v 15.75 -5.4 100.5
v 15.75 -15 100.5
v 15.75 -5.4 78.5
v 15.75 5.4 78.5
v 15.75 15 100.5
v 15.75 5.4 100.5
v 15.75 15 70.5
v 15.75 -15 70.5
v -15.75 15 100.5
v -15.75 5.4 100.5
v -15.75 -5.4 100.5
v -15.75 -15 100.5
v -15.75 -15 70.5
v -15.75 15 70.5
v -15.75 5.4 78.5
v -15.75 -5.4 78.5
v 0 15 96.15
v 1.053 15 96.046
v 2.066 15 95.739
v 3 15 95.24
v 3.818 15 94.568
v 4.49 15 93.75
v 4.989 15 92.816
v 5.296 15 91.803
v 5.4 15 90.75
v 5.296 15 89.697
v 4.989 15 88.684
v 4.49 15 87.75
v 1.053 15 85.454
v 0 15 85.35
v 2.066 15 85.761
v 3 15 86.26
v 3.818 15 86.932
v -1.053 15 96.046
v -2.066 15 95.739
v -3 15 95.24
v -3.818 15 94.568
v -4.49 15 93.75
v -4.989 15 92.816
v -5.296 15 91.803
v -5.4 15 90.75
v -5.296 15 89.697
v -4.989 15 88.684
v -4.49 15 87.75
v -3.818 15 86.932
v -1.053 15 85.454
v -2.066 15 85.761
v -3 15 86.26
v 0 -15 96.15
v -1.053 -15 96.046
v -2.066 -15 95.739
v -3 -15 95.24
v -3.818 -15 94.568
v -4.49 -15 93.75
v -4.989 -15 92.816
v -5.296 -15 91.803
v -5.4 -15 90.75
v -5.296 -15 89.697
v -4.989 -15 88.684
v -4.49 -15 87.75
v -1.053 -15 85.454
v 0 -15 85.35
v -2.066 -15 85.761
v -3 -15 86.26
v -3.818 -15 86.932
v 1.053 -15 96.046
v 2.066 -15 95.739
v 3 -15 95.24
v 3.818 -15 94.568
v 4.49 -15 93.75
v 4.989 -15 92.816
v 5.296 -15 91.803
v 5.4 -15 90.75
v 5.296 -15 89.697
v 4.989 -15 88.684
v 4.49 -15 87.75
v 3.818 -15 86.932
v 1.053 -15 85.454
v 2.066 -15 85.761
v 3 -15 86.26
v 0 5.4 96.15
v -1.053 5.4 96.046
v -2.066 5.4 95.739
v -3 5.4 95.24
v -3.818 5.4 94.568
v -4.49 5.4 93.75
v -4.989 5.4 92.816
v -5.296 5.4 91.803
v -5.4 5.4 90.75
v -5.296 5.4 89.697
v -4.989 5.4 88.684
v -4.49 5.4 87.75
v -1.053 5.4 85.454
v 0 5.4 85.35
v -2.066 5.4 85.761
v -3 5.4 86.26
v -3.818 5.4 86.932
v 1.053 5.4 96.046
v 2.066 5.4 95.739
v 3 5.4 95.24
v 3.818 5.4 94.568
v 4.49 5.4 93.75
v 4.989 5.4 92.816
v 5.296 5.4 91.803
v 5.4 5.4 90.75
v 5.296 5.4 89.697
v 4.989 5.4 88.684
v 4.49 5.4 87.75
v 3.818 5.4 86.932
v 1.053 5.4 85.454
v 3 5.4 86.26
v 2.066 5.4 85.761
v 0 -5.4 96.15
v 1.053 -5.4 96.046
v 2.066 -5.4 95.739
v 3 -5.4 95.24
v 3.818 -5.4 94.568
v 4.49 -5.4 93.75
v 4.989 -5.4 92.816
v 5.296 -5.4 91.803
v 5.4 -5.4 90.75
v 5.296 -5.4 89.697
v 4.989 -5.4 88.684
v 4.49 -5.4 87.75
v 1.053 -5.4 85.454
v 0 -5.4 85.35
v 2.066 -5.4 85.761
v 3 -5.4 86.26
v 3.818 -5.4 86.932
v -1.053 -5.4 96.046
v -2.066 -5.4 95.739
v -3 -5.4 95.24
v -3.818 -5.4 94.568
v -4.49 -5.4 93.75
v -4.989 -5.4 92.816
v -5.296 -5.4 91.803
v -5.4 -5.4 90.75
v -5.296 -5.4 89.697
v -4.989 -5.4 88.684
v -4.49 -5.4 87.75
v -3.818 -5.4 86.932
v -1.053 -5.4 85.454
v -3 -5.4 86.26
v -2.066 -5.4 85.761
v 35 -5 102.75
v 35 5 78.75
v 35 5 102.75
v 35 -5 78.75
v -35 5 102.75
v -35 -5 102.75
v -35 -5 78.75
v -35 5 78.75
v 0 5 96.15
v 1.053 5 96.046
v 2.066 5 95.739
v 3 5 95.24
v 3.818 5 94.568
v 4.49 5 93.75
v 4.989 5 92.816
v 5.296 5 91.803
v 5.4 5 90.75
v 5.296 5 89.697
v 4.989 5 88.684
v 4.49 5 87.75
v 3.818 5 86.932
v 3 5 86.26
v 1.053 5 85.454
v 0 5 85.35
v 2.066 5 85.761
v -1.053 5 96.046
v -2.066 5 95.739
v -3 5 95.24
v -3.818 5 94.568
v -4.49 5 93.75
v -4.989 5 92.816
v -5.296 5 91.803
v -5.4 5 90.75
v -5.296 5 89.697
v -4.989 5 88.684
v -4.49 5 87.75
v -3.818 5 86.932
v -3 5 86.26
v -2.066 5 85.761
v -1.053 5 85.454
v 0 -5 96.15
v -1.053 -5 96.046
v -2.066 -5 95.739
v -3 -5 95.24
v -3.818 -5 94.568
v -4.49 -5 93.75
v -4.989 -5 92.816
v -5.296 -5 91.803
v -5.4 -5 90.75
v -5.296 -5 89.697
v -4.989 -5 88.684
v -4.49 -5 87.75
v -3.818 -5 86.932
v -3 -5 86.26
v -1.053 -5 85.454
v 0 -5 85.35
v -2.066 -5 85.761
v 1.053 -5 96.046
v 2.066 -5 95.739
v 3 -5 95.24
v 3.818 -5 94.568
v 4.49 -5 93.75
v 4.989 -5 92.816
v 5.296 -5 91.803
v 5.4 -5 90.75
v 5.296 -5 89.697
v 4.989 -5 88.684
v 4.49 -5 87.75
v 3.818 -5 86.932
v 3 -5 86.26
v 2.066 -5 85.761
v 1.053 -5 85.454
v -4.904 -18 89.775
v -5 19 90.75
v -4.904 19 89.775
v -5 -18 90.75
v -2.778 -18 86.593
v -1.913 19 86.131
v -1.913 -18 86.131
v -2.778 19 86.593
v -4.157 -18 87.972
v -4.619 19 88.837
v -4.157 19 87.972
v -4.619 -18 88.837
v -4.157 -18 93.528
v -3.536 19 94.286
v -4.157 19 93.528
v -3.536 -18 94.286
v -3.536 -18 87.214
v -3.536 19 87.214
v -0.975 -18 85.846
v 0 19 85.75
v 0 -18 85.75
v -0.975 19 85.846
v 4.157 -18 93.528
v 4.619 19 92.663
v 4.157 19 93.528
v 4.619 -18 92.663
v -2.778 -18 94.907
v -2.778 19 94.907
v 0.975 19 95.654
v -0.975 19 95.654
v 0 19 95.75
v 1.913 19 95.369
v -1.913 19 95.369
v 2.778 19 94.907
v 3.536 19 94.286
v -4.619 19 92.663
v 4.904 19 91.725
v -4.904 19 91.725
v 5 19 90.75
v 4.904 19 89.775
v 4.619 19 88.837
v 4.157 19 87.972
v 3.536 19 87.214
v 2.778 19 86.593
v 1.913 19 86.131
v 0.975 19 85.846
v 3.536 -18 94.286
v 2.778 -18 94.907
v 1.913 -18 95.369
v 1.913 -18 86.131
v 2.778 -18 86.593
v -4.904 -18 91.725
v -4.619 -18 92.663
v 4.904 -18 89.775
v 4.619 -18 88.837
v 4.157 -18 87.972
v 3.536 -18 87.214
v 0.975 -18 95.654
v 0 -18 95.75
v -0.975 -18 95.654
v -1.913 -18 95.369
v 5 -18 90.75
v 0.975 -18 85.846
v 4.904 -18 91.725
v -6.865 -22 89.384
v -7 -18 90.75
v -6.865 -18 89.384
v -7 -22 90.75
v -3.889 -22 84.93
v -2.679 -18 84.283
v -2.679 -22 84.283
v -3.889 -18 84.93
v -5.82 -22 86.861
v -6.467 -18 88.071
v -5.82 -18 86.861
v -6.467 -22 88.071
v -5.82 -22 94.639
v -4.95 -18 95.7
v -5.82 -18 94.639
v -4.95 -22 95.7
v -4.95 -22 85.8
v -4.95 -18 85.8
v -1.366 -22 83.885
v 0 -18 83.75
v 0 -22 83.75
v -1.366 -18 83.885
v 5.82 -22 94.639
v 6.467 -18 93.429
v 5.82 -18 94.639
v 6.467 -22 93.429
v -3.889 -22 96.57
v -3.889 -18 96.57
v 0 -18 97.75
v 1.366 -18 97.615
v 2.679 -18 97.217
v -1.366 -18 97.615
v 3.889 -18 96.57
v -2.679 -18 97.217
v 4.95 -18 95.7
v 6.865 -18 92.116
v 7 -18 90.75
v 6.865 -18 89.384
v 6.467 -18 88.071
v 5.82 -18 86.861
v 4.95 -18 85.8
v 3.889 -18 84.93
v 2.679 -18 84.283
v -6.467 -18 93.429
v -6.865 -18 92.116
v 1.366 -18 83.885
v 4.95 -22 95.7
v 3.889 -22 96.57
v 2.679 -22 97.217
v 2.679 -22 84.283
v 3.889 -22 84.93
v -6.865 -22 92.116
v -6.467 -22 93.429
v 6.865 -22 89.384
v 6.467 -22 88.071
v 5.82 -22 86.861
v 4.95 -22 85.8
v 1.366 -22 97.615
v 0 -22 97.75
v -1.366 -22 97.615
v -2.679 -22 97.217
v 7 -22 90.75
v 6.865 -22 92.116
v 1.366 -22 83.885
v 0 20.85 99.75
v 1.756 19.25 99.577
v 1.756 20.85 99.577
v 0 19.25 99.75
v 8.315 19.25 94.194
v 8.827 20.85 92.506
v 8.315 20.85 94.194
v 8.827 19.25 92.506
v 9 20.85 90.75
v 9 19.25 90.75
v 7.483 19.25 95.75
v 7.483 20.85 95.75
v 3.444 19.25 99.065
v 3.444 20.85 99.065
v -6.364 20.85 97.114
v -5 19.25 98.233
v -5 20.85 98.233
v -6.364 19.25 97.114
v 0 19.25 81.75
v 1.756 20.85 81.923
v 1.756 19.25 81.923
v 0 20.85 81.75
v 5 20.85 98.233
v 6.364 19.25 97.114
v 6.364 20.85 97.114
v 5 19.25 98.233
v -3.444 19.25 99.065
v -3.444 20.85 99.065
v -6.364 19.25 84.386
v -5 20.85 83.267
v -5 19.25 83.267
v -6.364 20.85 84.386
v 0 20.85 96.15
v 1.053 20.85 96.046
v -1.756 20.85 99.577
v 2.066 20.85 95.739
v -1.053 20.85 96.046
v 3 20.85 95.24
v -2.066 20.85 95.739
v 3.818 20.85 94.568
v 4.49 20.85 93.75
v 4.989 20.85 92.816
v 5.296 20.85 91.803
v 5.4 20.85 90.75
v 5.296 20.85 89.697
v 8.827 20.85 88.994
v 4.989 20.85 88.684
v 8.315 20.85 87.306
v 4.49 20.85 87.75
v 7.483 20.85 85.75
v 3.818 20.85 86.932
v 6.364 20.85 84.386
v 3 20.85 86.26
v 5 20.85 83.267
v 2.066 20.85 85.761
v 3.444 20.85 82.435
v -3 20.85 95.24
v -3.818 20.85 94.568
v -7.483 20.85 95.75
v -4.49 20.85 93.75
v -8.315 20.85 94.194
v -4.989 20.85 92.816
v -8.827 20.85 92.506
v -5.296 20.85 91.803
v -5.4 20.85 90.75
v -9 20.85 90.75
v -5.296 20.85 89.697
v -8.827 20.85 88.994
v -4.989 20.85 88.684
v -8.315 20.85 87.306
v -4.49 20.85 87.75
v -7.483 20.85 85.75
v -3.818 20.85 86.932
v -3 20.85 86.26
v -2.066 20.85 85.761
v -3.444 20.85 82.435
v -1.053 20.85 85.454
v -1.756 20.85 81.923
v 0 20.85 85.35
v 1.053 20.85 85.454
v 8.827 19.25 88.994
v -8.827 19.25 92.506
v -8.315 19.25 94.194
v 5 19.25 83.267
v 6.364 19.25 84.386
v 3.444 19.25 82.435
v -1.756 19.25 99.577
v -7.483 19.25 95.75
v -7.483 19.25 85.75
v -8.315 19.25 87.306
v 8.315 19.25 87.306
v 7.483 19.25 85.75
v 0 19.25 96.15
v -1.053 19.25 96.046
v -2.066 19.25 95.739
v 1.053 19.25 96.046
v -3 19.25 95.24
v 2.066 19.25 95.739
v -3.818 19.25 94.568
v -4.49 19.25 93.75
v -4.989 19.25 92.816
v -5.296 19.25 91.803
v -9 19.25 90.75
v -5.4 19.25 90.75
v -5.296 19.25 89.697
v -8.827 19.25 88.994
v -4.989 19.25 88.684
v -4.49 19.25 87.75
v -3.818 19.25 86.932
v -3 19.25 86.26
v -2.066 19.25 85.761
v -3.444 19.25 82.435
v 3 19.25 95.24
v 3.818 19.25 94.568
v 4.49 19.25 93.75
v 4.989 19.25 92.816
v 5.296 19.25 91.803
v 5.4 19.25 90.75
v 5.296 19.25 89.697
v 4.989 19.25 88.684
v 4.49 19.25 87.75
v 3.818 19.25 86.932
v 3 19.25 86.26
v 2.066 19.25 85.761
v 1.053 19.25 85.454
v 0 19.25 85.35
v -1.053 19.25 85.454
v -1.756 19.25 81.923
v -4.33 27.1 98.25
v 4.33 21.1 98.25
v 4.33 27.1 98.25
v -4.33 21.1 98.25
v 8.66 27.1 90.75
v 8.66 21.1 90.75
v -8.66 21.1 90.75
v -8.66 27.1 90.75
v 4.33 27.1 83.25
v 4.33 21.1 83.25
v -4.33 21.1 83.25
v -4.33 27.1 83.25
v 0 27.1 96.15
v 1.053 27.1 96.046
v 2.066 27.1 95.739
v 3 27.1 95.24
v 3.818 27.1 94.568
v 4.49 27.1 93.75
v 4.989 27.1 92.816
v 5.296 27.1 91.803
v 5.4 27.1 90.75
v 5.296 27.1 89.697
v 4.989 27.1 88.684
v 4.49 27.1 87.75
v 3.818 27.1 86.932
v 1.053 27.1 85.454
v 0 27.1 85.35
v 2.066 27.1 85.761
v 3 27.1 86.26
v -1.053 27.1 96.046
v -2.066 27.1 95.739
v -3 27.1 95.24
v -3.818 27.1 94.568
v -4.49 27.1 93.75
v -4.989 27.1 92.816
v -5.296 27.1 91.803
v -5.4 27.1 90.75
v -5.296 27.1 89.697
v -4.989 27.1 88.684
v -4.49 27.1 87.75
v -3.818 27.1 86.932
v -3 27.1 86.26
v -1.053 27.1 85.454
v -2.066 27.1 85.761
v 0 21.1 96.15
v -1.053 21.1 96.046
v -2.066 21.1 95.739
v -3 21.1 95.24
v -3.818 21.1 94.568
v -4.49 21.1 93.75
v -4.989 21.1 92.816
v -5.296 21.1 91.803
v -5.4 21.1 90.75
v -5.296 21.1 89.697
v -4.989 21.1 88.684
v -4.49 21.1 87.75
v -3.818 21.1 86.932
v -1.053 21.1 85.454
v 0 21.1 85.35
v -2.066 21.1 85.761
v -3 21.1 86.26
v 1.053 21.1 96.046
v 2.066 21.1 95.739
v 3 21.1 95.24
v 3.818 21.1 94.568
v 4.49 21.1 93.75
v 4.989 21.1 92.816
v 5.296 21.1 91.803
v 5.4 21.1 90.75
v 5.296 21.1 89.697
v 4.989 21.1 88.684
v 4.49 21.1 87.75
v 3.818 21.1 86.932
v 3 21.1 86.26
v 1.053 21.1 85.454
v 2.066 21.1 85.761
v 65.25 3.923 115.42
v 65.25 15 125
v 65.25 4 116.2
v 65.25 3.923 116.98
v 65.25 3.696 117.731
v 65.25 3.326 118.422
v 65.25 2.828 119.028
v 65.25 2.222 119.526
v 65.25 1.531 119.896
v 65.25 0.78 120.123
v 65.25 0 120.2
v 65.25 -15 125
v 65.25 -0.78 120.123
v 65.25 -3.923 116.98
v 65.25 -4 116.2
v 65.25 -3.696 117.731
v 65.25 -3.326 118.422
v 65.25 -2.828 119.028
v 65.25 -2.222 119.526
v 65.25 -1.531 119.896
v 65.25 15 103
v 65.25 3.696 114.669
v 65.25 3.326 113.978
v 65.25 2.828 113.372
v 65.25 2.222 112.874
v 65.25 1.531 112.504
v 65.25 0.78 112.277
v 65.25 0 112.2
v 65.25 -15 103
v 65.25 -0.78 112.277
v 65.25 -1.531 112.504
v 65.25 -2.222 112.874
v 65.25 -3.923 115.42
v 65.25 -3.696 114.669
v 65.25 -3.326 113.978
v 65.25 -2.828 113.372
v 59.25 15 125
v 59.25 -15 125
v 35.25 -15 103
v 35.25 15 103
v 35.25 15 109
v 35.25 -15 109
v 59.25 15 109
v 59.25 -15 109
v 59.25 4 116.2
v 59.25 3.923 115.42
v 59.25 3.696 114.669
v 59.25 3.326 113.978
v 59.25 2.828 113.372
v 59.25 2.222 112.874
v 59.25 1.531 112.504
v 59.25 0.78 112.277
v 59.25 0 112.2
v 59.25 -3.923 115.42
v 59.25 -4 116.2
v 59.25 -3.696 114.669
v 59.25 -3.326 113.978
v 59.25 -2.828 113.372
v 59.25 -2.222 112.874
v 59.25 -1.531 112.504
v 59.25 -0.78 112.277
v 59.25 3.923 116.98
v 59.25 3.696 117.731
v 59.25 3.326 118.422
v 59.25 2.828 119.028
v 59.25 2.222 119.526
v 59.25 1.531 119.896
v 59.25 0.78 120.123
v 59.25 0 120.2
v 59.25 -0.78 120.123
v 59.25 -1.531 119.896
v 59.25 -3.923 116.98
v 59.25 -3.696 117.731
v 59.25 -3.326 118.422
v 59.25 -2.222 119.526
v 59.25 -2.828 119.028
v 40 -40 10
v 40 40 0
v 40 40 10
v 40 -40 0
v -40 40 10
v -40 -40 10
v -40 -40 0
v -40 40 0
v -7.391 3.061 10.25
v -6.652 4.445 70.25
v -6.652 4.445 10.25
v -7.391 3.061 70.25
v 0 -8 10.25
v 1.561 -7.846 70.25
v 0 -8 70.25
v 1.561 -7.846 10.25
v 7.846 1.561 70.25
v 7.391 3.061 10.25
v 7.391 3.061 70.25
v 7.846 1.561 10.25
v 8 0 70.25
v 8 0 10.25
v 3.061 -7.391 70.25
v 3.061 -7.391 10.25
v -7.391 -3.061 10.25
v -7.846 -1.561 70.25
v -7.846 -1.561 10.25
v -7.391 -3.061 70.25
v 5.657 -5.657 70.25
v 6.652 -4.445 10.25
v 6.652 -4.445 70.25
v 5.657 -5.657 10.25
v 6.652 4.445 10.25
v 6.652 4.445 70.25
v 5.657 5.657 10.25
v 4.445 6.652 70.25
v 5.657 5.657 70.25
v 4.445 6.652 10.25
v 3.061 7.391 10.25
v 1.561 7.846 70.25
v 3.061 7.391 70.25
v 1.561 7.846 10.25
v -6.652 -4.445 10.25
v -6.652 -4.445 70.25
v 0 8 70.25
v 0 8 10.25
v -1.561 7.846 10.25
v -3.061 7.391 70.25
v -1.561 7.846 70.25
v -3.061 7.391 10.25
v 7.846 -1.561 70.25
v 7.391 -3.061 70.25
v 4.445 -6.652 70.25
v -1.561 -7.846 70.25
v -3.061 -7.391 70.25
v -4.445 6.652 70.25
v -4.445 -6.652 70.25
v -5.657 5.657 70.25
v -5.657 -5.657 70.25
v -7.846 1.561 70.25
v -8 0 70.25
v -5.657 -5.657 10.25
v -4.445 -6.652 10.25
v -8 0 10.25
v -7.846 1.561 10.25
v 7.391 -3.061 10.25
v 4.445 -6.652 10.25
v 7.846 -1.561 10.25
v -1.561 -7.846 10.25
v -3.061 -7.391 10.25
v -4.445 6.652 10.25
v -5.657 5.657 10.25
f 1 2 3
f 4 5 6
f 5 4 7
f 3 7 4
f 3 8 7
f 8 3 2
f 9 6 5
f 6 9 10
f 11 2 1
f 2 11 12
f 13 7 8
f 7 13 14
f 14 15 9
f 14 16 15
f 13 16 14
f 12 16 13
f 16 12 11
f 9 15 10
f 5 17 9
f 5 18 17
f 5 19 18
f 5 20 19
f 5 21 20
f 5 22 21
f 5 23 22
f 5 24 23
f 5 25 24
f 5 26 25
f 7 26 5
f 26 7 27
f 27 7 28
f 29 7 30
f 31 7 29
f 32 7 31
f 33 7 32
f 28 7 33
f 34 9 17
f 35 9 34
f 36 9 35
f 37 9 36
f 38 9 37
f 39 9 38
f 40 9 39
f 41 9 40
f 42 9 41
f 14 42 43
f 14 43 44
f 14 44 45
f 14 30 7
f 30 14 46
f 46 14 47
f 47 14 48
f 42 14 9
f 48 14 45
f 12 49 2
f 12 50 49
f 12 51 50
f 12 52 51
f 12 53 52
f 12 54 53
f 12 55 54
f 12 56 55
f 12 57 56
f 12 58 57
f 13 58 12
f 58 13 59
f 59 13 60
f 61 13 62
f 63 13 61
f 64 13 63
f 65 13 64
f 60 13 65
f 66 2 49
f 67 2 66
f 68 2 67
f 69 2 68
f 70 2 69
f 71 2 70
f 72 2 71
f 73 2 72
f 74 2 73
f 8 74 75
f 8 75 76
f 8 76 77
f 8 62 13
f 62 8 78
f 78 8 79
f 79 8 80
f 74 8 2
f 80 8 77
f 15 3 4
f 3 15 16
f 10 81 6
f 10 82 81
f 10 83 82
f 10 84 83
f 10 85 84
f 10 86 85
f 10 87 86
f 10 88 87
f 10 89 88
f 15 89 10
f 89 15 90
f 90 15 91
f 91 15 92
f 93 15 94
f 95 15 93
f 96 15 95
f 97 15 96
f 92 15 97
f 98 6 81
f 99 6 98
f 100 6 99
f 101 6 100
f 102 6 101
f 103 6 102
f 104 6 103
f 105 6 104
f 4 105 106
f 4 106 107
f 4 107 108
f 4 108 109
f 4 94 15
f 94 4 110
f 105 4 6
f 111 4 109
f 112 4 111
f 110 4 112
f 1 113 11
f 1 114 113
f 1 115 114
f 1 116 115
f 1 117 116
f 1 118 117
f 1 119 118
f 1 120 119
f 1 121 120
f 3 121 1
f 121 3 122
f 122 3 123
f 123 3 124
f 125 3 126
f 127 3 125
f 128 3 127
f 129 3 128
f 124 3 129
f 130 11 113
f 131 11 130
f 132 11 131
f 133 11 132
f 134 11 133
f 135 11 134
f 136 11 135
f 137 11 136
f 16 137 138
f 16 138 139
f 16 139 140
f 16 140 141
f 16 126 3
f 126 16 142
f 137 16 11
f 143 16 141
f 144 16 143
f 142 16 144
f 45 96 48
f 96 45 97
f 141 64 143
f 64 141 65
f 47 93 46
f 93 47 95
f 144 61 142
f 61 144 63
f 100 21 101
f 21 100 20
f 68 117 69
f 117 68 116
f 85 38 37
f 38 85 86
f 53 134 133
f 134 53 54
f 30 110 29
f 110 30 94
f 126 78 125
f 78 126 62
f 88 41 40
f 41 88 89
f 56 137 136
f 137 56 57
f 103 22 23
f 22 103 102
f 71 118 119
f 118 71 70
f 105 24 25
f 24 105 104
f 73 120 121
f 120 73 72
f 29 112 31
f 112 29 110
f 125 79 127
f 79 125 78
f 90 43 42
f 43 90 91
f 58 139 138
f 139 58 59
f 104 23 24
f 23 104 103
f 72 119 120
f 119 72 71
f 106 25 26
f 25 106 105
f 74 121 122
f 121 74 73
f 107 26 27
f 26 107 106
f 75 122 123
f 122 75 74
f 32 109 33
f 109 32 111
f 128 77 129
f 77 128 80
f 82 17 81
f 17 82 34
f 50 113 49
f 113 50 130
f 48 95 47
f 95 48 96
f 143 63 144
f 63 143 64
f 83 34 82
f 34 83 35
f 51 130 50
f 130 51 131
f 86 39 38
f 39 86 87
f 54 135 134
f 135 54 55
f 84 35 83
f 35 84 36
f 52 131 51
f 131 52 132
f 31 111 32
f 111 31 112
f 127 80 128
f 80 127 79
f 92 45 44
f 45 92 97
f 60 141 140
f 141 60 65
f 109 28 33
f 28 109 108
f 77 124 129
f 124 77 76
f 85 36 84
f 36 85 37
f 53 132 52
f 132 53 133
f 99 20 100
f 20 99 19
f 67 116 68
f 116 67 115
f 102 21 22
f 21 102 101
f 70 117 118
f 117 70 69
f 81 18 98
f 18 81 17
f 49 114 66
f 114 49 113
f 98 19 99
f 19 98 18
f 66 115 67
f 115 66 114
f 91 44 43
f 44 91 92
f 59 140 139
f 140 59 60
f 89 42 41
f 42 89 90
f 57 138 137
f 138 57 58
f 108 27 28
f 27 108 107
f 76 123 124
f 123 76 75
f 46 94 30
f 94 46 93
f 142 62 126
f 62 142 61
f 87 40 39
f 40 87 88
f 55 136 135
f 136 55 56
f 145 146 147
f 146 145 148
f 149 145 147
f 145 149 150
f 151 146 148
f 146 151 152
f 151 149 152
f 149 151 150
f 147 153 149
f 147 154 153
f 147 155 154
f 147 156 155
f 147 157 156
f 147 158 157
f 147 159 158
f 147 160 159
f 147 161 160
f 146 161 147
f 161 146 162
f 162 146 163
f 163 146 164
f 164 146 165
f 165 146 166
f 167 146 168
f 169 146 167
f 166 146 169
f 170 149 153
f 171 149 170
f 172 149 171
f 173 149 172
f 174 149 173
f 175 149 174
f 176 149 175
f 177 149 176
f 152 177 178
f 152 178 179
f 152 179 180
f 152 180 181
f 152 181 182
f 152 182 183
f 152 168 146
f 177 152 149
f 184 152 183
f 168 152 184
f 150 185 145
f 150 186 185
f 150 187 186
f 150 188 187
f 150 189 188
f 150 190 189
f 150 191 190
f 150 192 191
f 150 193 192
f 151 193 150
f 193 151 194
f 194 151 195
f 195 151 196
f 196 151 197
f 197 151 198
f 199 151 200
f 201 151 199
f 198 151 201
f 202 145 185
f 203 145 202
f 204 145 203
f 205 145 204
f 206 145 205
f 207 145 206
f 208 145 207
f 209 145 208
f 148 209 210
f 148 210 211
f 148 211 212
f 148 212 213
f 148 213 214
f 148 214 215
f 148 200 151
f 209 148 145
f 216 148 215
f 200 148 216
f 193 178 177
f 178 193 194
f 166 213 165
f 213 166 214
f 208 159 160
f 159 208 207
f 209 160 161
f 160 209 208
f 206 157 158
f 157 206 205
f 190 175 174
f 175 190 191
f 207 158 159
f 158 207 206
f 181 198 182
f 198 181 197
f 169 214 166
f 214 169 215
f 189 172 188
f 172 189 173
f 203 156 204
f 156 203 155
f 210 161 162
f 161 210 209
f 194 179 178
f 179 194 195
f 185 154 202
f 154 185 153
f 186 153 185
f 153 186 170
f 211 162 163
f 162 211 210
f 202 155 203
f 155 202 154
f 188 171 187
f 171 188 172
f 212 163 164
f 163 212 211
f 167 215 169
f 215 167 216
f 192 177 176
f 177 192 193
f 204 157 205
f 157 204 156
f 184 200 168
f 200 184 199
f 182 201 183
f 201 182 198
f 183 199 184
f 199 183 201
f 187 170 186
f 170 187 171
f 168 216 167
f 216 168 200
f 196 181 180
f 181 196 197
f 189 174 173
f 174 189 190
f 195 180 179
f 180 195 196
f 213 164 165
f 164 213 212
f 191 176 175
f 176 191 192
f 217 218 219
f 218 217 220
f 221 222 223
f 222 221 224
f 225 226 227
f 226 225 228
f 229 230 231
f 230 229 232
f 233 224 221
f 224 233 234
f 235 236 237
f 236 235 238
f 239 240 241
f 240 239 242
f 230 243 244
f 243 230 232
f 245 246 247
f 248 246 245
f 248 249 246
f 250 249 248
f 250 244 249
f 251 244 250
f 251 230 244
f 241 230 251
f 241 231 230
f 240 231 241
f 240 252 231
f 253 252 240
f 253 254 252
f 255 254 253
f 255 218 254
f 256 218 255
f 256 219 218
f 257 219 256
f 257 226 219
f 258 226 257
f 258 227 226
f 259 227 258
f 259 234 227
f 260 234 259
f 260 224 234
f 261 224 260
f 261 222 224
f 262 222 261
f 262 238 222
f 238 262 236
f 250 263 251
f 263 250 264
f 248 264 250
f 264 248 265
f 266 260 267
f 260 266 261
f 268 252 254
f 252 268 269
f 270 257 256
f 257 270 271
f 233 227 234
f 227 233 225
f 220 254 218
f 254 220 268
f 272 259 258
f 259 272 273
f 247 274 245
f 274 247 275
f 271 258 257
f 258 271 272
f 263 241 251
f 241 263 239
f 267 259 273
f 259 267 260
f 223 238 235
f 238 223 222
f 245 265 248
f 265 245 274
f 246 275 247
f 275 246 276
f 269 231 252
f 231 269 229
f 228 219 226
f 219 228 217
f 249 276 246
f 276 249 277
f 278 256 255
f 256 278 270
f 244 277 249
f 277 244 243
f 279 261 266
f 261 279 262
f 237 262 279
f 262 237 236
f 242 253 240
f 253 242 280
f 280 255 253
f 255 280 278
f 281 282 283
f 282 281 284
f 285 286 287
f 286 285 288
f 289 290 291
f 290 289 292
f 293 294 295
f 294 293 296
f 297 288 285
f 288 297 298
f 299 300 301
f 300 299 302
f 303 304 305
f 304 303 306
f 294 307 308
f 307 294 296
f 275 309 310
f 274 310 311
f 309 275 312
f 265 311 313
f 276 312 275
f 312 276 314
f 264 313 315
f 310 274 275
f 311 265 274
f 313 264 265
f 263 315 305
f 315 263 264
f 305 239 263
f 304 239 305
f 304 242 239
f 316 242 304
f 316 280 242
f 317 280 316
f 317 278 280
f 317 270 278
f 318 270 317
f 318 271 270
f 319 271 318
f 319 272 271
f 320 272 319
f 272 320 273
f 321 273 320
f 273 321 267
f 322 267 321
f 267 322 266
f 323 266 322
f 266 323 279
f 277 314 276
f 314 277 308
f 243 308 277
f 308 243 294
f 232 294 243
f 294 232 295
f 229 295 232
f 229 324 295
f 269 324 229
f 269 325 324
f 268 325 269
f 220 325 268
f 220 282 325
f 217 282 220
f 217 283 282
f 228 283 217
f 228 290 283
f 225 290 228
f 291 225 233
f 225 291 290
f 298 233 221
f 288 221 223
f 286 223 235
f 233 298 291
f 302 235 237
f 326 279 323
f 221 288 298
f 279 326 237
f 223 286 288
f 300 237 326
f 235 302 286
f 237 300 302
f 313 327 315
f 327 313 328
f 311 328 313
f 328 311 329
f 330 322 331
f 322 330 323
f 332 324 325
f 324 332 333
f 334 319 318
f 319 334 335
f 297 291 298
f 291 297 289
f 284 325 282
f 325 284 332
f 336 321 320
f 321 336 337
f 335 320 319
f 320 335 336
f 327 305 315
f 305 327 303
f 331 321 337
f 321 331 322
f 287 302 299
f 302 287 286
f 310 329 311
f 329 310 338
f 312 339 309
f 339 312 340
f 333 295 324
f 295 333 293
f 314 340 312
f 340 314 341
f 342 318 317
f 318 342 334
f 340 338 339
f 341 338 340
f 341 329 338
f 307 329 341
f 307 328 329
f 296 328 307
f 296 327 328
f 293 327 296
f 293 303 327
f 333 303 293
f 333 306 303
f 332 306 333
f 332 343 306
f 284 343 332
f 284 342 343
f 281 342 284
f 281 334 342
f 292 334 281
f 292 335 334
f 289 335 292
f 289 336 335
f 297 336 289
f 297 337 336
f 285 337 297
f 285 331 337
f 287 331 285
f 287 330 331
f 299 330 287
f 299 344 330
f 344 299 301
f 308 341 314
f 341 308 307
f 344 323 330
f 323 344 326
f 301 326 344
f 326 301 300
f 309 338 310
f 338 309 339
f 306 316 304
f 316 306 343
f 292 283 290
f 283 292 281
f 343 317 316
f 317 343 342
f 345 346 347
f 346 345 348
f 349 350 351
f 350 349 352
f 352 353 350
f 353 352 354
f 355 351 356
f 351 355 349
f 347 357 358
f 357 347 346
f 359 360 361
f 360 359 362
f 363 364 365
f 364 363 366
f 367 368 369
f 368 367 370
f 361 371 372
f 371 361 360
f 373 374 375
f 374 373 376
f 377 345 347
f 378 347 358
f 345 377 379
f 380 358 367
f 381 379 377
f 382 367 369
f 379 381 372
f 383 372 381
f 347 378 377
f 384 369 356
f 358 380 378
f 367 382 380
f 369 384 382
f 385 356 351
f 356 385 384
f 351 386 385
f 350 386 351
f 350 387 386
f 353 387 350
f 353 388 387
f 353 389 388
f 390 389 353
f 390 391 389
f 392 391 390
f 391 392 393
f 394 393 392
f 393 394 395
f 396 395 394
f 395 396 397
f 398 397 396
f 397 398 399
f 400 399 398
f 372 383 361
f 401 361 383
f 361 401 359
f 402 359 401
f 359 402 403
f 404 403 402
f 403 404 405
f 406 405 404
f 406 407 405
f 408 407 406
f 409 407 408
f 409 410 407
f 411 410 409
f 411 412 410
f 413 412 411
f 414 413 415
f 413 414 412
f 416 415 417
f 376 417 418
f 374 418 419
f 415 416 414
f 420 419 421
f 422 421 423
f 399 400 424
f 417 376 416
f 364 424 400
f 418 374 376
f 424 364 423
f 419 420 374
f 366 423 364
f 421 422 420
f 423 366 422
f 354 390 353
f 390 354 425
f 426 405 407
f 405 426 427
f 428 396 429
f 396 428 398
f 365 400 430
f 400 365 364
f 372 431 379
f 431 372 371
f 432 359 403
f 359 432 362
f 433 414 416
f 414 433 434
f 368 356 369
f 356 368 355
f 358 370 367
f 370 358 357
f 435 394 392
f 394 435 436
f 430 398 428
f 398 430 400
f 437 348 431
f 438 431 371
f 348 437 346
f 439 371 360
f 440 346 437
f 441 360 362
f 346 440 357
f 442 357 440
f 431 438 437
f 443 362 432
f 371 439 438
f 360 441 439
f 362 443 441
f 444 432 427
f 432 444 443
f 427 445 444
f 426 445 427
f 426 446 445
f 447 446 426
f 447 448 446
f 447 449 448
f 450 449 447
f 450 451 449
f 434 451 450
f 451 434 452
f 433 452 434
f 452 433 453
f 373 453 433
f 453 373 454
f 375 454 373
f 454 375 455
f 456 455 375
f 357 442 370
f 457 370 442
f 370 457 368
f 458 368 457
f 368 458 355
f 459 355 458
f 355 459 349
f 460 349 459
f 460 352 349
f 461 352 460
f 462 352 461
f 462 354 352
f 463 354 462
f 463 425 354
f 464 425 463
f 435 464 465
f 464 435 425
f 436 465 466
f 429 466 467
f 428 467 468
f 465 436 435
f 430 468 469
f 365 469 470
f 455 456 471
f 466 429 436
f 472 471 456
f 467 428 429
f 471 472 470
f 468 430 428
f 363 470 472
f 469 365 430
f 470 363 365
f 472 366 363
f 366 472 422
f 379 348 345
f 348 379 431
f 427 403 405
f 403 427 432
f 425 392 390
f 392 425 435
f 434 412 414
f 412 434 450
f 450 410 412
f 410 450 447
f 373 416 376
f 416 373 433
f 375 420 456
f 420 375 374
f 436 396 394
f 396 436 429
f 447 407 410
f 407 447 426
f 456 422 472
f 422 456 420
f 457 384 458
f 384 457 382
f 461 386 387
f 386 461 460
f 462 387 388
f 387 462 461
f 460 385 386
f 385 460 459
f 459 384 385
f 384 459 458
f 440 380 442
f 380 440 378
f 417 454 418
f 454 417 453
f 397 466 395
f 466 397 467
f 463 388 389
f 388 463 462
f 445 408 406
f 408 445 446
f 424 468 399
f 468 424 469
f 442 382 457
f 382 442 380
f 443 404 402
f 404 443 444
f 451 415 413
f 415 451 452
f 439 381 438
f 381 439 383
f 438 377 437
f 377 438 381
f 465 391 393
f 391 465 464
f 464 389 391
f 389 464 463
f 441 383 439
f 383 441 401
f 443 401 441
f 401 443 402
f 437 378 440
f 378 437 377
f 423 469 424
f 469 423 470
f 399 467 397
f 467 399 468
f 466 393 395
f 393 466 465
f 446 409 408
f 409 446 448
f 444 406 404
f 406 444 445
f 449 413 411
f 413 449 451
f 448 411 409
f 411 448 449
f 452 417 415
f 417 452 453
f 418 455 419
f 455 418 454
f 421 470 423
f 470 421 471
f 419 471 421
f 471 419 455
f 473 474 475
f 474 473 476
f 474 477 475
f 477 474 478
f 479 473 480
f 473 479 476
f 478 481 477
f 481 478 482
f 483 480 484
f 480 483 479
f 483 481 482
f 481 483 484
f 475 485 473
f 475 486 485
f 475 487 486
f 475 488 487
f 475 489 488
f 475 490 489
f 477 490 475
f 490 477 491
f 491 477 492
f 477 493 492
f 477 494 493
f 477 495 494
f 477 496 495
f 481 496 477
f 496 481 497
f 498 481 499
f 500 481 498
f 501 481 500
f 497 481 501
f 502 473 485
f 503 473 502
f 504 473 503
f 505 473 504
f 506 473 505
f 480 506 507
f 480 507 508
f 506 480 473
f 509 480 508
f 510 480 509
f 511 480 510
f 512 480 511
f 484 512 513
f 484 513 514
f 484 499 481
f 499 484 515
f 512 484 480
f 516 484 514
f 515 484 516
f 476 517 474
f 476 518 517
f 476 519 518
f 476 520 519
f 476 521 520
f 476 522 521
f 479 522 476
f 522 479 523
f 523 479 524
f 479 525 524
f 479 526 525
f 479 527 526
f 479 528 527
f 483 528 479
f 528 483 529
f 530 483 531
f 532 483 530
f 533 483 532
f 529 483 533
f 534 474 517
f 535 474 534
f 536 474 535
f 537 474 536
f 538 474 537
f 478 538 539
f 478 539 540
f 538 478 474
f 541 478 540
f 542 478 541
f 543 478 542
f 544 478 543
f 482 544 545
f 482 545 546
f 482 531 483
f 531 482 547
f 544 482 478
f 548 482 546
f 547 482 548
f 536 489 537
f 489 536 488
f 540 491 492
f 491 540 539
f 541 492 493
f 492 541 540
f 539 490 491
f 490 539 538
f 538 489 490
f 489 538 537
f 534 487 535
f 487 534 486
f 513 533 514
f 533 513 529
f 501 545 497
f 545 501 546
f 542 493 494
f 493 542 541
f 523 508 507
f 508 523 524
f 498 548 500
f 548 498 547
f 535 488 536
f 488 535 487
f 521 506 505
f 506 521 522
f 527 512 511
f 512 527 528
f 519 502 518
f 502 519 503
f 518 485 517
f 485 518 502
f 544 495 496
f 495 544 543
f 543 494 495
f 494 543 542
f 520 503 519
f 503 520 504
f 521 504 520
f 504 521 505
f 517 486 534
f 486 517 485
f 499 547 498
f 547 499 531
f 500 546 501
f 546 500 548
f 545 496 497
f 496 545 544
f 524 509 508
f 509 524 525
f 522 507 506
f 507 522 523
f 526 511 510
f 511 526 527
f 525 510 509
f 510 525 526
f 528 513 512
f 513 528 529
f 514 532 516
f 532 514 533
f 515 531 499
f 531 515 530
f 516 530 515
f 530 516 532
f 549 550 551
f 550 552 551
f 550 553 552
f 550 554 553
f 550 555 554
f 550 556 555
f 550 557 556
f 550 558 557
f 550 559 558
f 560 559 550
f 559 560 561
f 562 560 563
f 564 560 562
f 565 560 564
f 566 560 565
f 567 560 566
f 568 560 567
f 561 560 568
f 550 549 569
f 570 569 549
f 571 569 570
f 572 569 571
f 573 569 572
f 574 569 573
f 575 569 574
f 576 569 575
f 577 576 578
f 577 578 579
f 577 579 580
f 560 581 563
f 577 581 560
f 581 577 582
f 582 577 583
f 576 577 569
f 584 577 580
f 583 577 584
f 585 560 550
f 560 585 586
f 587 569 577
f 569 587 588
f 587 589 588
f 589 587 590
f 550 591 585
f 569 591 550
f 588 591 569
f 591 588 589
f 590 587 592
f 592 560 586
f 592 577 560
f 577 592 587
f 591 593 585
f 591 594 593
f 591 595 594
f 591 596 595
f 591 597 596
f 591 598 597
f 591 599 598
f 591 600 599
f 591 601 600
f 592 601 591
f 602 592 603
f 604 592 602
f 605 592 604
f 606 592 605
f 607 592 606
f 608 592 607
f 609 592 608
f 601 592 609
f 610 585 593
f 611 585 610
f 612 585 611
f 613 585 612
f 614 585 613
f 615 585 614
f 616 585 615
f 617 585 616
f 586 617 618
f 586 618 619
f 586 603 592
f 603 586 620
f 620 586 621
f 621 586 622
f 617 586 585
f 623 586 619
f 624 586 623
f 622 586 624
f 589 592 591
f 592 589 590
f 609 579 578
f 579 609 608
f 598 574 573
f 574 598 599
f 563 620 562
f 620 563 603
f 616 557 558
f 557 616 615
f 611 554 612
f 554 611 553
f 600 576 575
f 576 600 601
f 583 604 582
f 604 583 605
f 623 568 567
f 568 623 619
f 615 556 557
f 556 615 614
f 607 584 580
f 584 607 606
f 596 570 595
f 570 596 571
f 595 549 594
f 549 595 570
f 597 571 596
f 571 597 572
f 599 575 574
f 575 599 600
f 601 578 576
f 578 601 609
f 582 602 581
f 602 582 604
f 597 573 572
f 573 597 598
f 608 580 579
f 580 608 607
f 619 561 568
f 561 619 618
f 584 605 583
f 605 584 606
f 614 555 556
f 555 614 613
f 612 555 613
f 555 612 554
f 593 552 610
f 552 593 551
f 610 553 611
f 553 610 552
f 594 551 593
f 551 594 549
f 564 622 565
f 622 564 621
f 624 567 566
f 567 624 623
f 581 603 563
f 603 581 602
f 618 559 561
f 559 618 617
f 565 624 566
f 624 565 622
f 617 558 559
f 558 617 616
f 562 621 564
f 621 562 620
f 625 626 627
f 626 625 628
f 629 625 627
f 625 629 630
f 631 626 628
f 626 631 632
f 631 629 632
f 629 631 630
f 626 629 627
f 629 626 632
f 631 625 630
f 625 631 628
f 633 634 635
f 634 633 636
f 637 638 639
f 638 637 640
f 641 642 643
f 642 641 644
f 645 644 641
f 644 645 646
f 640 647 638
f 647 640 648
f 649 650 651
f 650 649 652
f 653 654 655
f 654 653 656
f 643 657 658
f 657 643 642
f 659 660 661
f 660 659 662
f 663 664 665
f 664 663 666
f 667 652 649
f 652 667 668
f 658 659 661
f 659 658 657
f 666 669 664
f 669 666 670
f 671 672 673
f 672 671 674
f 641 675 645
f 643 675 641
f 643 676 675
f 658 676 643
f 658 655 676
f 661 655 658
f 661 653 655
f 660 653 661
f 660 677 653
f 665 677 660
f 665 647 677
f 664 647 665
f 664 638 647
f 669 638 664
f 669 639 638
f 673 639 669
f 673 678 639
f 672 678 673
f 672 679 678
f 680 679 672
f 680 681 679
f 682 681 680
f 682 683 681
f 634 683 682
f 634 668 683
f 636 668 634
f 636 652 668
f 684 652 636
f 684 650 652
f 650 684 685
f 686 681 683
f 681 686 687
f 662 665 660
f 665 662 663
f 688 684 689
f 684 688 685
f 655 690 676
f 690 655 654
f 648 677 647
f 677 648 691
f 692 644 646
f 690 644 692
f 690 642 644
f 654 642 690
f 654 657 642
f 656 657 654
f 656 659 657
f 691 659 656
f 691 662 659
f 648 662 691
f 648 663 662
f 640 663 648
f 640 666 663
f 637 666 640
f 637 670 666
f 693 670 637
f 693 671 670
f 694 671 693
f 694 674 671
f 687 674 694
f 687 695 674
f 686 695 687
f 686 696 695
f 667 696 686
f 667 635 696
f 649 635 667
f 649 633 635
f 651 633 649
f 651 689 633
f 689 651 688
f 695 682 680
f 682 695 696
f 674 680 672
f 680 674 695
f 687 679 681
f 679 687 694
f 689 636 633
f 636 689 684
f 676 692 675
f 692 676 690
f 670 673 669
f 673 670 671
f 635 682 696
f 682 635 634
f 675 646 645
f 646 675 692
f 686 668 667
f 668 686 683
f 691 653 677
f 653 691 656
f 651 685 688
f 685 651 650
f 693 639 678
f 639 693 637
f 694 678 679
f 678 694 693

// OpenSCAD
$fn = 32;

// ------------------------------------------------------------------------
// Lamp arm: column d16 x 60 mm, arm 70 mm
// Every part is its own module, assembly() places every instance.
// ------------------------------------------------------------------------

// --- part 1 ---
module lamp_base() {
  difference() {
    translate([-40, -40, 0]) cube([80, 80, 10]);
  }
}

// --- part 2 ---
module lamp_column() {
  cylinder(h = 60, d = 16);
}

// --- part 3 ---
module head_fork() {
  difference() {
    translate([-15.75, -15, 0]) cube([31.5, 30, 30]);
    translate([-16.75, -5.4, 8]) cube([33.5, 10.8, 23]);
    translate([0, 0, 20.25]) rotate([90, 0, 0]) cylinder(h = 32, d = 10.8, center = true);
  }
}

// --- part 4 ---
module lamp_arm() {
  difference() {
    translate([-35, -5, 0]) cube([70, 10, 24]);
    translate([0, 0, 12]) rotate([90, 0, 0]) cylinder(h = 12, d = 10.8, center = true);
  }
}

// --- part 5 ---
module arm_pin() {
  rotate([0, 90, 0]) cylinder(h = 38, d = 10, center = true);
  translate([-22, 0, 0]) rotate([0, 90, 0]) cylinder(h = 4, d = 14);
}

// --- part 6 ---
module arm_washer() {
  difference() {
      translate([0, 0, 0]) cylinder(h = 1.6, d = 18);
      translate([0, 0, -1]) cylinder(h = 3.6, d = 10.8);
    }
}

// --- part 7 ---
module arm_nut() {
  difference() {
    linear_extrude(height = 6) polygon(points = [[8.66, 0], [4.33, 7.5], [-4.33, 7.5], [-8.66, 0], [-4.33, -7.5], [4.33, -7.5]]);
    translate([0, 0, -1]) cylinder(h = 8, d = 10.8);
  }
}

// --- part 8 ---
module shade_bracket() {
  difference() {
    translate([-15, -15, 0]) cube([30, 30, 22]);
    translate([-16, -16, 6]) cube([25, 32, 17]);
    translate([12, 0, 13.2]) rotate([0, 90, 0]) cylinder(h = 8, d = 8, center = true);
  }
}

// --- assembly ---
module assembly() {
  color([0.80, 0.24, 0.20]) translate([0, 0, 0]) rotate([0, 0, 0]) lamp_base();
  color([0.20, 0.45, 0.75]) translate([0, 0, 10.25]) rotate([0, 0, 0]) lamp_column();
  color([0.25, 0.62, 0.32]) translate([0, 0, 70.5]) rotate([0, 0, 0]) head_fork();
  color([0.92, 0.70, 0.18]) translate([0, 0, 78.75]) rotate([0, 0, 0]) lamp_arm();
  color([0.58, 0.35, 0.70]) translate([0, 0, 90.75]) rotate([0, 0, 90]) arm_pin();
  color([0.16, 0.66, 0.66]) translate([0, 20.85, 90.75]) rotate([90, 0, 0]) arm_washer();
  color([0.85, 0.48, 0.18]) translate([0, 27.1, 90.75]) rotate([90, 0, 0]) arm_nut();
  color([0.55, 0.60, 0.65]) translate([50.25, 0, 103]) rotate([0, 0, 0]) shade_bracket();
}

assembly();
